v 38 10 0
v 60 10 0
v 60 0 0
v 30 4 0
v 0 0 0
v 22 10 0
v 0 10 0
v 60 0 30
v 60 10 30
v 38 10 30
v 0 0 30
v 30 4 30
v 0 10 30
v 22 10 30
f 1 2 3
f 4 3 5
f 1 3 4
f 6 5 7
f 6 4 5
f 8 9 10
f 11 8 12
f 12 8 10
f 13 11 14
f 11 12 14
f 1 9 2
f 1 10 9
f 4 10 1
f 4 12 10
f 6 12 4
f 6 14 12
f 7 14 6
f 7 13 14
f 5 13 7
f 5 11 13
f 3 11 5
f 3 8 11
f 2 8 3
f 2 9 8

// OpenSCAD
$fn = 32;

// ----------------------------------------------------------------------
// V guide rail: vway, 60 mm wide
// ----------------------------------------------------------------------

// --- parameters (mm) ---
rail_w = 60;              // rail width, X
base_t = 10;              // base plate thickness
v_depth = 6;              // V feature depth / height
v_half_w = 8;             // half width of the V at the base face
plate_t = 30;             // rail length, Z (the extrusion height)

profile = [[0, 0], [60, 0], [60, 10], [38, 10], [30, 4], [22, 10], [0, 10]];  // primary outline, 7 points, counter clockwise

// --- the one profile operation ---
linear_extrude(height = plate_t) polygon(points = profile);
